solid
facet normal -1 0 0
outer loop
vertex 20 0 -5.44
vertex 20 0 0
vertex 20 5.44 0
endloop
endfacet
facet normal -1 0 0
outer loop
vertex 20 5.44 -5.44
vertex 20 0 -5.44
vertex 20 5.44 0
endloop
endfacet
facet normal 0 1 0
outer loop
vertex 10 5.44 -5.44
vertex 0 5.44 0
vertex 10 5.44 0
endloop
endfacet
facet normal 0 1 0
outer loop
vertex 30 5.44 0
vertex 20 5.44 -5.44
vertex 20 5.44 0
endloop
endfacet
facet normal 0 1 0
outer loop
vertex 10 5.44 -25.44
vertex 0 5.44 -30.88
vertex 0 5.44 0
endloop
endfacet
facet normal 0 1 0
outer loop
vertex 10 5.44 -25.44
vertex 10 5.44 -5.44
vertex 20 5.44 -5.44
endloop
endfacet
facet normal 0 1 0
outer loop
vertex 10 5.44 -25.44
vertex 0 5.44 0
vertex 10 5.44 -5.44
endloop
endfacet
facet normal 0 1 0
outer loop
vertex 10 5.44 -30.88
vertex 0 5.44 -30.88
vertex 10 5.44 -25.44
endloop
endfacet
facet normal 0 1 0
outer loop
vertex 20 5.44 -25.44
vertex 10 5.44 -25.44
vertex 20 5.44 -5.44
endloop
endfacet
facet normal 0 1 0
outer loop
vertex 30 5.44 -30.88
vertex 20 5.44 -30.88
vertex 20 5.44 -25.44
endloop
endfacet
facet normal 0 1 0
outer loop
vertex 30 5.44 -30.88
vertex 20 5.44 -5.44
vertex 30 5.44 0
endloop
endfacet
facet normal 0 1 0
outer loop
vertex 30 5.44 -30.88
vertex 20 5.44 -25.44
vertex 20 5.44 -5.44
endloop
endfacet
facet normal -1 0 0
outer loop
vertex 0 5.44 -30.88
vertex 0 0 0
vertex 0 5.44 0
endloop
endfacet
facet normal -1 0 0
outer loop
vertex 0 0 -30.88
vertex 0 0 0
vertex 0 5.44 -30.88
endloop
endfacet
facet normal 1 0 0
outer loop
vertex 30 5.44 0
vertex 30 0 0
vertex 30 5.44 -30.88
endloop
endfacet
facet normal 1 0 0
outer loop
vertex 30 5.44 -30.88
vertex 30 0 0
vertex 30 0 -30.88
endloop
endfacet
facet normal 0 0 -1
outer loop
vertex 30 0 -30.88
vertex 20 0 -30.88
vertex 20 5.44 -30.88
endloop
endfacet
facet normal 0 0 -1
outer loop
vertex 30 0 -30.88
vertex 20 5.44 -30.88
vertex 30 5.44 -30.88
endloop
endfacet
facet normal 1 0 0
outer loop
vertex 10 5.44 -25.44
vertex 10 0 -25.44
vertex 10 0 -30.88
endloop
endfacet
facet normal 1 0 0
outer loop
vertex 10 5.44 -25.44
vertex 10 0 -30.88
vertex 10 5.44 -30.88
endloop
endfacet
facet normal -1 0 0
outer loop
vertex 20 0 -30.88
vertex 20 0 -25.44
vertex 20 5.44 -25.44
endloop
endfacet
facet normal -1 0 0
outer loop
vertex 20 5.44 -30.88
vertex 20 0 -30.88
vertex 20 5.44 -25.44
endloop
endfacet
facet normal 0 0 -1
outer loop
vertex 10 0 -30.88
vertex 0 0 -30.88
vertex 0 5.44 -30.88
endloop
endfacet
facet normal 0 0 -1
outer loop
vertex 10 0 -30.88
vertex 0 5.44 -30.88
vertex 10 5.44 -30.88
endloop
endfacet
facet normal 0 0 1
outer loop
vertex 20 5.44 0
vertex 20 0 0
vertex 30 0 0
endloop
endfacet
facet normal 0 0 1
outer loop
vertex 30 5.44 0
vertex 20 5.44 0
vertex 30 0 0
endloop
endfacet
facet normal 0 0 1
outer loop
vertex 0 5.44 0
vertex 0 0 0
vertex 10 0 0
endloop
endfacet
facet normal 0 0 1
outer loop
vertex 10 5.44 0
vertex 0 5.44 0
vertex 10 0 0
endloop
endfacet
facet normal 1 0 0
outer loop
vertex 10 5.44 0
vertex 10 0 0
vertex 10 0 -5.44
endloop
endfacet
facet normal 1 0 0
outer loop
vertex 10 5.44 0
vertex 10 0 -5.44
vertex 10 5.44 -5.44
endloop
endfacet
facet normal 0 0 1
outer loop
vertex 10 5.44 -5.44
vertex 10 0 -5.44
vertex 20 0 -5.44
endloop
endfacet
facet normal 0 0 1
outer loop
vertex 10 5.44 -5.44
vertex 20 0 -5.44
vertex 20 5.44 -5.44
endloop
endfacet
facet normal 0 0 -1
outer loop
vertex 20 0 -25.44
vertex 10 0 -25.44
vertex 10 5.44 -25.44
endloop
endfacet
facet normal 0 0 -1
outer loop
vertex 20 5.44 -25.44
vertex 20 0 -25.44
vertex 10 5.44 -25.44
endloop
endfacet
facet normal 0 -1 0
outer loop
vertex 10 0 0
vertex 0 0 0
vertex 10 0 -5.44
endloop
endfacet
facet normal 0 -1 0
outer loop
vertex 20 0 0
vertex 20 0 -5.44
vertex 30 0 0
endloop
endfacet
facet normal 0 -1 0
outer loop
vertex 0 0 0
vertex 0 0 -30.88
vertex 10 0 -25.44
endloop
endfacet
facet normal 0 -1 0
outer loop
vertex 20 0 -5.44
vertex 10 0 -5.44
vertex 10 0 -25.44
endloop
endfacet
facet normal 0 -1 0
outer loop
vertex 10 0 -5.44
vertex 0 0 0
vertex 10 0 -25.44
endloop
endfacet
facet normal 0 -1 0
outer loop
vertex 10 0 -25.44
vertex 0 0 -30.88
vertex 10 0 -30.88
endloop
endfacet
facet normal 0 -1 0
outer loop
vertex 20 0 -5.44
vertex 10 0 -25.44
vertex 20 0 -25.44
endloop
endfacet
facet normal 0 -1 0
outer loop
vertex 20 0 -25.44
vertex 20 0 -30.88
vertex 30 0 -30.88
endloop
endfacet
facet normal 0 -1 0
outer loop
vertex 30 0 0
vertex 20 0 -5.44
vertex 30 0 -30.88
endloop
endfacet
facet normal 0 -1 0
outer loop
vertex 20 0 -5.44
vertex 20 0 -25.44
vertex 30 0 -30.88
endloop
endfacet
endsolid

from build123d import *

# Parameters (mm, degrees)
SKETCH1_W           = 30
SKETCH1_H           = 30.88
BOSS_EXTRUDE1_DEPTH = 5.44
CAVITY1_START       = 10
CAVITY1_OUTLINE_W   = 5.44
CAVITY1_OUTLINE_H   = 5.44
CAVITY1_DEPTH       = 10


# Read off the part's stored shape, not the designer's step: Cavity1
with BuildPart() as part:
    # Sketch1 → Boss-Extrude1 (new body)
    with BuildSketch(Plane(origin=(0, 0, 0), x_dir=(1, 0, 0), z_dir=(0, 1, 0))):
        with Locations((15, 15.44)):
            Rectangle(SKETCH1_W, SKETCH1_H)
    extrude(amount=BOSS_EXTRUDE1_DEPTH)

    # Cavity1 outline → Cavity1 (cut)
    with BuildSketch(Plane.YZ.offset(CAVITY1_START)):
        with Locations((2.72, -28.16)):
            Rectangle(CAVITY1_OUTLINE_W, CAVITY1_OUTLINE_H)
        with Locations((2.72, -2.72)):
            Rectangle(CAVITY1_OUTLINE_W, CAVITY1_OUTLINE_H)
    extrude(amount=CAVITY1_DEPTH, mode=Mode.SUBTRACT)


solid = part.part
